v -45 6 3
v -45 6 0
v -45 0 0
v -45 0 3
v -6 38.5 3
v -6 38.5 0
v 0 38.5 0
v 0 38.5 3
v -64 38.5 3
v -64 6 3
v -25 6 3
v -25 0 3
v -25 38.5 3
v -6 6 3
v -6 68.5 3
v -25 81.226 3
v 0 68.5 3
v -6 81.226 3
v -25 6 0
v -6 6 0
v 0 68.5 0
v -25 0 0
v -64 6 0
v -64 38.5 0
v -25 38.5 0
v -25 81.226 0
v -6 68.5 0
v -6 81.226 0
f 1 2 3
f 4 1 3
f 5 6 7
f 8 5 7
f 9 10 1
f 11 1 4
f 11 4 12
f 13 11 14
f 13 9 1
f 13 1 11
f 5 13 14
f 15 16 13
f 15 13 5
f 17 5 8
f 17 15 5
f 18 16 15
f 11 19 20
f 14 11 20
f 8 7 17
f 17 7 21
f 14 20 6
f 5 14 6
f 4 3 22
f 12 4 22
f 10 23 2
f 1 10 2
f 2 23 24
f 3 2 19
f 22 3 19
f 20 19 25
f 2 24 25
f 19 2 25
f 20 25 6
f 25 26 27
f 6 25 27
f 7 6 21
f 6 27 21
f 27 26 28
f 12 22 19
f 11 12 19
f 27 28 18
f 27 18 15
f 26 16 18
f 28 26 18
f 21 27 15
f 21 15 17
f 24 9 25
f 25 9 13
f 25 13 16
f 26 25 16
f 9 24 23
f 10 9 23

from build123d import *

# Parameters (mm, degrees)
ESQUISSE1_W             = 70
ESQUISSE1_H             = 110
BOSS_EXTRU_1_DEPTH      = 3
ENL_V_MAT_EXTRU_1_DEPTH = 131.418556962
ENL_V_MAT_EXTRU_2_DEPTH = 10


with BuildPart() as part:
    # Esquisse1 → Boss.-Extru.1 (new body)
    with BuildSketch(Plane.XY):
        with Locations((-35, 55)):
            Rectangle(ESQUISSE1_W, ESQUISSE1_H)
    extrude(amount=BOSS_EXTRU_1_DEPTH)

    # Esquisse2 → Enlèv. mat.-Extru.1 (cut, through all)
    with BuildSketch(Plane(origin=(0, 0, 0), x_dir=(-1, 0, 0), z_dir=(0, 0, -1))):
        Polygon((0, 110), (25, 110), (25, 104), (6, 104), (6, 68.5), (0, 68.5), align=None)
        Polygon((70, 110), (45, 110), (45, 104), (64, 104), (64, 68.5), (70, 68.5), align=None)
        Polygon((0, 0), (25, 0), (25, 6), (6, 6), (6, 38.5), (0, 38.5), align=None)
        Polygon((45, 0), (70, 0), (70, 38.5), (64, 38.5), (64, 6), (45, 6), align=None)
    extrude(amount=-ENL_V_MAT_EXTRU_1_DEPTH, mode=Mode.SUBTRACT)

    # Esquisse3 → Enlèv. mat.-Extru.2 (cut)
    with BuildSketch(Plane.XY.offset(3)):
        Polygon((-70, 38.5), (-25, 38.5), (-25, 81.225715449), (-2.235916109, 81.225715449), (-2.235916109, 110), (-25, 110), (-70, 110), align=None)
    extrude(amount=-ENL_V_MAT_EXTRU_2_DEPTH, mode=Mode.SUBTRACT)


solid = part.part
